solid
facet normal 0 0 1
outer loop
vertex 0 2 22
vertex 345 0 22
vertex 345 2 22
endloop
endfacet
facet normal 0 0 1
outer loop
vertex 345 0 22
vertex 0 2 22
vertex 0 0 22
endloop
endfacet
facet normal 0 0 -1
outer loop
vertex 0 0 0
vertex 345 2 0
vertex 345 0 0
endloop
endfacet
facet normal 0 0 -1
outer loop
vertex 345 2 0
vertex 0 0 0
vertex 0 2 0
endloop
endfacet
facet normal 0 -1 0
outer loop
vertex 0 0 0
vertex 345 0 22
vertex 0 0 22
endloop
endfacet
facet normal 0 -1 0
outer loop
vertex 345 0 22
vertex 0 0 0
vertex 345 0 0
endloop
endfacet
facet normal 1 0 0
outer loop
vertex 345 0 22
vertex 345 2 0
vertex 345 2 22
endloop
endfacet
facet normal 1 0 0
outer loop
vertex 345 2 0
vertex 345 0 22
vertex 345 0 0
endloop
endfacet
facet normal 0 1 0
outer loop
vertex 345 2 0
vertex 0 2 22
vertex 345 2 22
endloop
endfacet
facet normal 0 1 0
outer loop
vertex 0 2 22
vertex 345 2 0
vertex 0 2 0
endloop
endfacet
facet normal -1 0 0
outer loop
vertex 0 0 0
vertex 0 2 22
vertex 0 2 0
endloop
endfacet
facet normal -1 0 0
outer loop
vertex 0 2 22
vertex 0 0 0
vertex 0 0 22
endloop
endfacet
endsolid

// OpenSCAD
//Schluesselleiste

width=345;
height=22;
depth=2;
t=depth;
cube([width, depth, height]);
